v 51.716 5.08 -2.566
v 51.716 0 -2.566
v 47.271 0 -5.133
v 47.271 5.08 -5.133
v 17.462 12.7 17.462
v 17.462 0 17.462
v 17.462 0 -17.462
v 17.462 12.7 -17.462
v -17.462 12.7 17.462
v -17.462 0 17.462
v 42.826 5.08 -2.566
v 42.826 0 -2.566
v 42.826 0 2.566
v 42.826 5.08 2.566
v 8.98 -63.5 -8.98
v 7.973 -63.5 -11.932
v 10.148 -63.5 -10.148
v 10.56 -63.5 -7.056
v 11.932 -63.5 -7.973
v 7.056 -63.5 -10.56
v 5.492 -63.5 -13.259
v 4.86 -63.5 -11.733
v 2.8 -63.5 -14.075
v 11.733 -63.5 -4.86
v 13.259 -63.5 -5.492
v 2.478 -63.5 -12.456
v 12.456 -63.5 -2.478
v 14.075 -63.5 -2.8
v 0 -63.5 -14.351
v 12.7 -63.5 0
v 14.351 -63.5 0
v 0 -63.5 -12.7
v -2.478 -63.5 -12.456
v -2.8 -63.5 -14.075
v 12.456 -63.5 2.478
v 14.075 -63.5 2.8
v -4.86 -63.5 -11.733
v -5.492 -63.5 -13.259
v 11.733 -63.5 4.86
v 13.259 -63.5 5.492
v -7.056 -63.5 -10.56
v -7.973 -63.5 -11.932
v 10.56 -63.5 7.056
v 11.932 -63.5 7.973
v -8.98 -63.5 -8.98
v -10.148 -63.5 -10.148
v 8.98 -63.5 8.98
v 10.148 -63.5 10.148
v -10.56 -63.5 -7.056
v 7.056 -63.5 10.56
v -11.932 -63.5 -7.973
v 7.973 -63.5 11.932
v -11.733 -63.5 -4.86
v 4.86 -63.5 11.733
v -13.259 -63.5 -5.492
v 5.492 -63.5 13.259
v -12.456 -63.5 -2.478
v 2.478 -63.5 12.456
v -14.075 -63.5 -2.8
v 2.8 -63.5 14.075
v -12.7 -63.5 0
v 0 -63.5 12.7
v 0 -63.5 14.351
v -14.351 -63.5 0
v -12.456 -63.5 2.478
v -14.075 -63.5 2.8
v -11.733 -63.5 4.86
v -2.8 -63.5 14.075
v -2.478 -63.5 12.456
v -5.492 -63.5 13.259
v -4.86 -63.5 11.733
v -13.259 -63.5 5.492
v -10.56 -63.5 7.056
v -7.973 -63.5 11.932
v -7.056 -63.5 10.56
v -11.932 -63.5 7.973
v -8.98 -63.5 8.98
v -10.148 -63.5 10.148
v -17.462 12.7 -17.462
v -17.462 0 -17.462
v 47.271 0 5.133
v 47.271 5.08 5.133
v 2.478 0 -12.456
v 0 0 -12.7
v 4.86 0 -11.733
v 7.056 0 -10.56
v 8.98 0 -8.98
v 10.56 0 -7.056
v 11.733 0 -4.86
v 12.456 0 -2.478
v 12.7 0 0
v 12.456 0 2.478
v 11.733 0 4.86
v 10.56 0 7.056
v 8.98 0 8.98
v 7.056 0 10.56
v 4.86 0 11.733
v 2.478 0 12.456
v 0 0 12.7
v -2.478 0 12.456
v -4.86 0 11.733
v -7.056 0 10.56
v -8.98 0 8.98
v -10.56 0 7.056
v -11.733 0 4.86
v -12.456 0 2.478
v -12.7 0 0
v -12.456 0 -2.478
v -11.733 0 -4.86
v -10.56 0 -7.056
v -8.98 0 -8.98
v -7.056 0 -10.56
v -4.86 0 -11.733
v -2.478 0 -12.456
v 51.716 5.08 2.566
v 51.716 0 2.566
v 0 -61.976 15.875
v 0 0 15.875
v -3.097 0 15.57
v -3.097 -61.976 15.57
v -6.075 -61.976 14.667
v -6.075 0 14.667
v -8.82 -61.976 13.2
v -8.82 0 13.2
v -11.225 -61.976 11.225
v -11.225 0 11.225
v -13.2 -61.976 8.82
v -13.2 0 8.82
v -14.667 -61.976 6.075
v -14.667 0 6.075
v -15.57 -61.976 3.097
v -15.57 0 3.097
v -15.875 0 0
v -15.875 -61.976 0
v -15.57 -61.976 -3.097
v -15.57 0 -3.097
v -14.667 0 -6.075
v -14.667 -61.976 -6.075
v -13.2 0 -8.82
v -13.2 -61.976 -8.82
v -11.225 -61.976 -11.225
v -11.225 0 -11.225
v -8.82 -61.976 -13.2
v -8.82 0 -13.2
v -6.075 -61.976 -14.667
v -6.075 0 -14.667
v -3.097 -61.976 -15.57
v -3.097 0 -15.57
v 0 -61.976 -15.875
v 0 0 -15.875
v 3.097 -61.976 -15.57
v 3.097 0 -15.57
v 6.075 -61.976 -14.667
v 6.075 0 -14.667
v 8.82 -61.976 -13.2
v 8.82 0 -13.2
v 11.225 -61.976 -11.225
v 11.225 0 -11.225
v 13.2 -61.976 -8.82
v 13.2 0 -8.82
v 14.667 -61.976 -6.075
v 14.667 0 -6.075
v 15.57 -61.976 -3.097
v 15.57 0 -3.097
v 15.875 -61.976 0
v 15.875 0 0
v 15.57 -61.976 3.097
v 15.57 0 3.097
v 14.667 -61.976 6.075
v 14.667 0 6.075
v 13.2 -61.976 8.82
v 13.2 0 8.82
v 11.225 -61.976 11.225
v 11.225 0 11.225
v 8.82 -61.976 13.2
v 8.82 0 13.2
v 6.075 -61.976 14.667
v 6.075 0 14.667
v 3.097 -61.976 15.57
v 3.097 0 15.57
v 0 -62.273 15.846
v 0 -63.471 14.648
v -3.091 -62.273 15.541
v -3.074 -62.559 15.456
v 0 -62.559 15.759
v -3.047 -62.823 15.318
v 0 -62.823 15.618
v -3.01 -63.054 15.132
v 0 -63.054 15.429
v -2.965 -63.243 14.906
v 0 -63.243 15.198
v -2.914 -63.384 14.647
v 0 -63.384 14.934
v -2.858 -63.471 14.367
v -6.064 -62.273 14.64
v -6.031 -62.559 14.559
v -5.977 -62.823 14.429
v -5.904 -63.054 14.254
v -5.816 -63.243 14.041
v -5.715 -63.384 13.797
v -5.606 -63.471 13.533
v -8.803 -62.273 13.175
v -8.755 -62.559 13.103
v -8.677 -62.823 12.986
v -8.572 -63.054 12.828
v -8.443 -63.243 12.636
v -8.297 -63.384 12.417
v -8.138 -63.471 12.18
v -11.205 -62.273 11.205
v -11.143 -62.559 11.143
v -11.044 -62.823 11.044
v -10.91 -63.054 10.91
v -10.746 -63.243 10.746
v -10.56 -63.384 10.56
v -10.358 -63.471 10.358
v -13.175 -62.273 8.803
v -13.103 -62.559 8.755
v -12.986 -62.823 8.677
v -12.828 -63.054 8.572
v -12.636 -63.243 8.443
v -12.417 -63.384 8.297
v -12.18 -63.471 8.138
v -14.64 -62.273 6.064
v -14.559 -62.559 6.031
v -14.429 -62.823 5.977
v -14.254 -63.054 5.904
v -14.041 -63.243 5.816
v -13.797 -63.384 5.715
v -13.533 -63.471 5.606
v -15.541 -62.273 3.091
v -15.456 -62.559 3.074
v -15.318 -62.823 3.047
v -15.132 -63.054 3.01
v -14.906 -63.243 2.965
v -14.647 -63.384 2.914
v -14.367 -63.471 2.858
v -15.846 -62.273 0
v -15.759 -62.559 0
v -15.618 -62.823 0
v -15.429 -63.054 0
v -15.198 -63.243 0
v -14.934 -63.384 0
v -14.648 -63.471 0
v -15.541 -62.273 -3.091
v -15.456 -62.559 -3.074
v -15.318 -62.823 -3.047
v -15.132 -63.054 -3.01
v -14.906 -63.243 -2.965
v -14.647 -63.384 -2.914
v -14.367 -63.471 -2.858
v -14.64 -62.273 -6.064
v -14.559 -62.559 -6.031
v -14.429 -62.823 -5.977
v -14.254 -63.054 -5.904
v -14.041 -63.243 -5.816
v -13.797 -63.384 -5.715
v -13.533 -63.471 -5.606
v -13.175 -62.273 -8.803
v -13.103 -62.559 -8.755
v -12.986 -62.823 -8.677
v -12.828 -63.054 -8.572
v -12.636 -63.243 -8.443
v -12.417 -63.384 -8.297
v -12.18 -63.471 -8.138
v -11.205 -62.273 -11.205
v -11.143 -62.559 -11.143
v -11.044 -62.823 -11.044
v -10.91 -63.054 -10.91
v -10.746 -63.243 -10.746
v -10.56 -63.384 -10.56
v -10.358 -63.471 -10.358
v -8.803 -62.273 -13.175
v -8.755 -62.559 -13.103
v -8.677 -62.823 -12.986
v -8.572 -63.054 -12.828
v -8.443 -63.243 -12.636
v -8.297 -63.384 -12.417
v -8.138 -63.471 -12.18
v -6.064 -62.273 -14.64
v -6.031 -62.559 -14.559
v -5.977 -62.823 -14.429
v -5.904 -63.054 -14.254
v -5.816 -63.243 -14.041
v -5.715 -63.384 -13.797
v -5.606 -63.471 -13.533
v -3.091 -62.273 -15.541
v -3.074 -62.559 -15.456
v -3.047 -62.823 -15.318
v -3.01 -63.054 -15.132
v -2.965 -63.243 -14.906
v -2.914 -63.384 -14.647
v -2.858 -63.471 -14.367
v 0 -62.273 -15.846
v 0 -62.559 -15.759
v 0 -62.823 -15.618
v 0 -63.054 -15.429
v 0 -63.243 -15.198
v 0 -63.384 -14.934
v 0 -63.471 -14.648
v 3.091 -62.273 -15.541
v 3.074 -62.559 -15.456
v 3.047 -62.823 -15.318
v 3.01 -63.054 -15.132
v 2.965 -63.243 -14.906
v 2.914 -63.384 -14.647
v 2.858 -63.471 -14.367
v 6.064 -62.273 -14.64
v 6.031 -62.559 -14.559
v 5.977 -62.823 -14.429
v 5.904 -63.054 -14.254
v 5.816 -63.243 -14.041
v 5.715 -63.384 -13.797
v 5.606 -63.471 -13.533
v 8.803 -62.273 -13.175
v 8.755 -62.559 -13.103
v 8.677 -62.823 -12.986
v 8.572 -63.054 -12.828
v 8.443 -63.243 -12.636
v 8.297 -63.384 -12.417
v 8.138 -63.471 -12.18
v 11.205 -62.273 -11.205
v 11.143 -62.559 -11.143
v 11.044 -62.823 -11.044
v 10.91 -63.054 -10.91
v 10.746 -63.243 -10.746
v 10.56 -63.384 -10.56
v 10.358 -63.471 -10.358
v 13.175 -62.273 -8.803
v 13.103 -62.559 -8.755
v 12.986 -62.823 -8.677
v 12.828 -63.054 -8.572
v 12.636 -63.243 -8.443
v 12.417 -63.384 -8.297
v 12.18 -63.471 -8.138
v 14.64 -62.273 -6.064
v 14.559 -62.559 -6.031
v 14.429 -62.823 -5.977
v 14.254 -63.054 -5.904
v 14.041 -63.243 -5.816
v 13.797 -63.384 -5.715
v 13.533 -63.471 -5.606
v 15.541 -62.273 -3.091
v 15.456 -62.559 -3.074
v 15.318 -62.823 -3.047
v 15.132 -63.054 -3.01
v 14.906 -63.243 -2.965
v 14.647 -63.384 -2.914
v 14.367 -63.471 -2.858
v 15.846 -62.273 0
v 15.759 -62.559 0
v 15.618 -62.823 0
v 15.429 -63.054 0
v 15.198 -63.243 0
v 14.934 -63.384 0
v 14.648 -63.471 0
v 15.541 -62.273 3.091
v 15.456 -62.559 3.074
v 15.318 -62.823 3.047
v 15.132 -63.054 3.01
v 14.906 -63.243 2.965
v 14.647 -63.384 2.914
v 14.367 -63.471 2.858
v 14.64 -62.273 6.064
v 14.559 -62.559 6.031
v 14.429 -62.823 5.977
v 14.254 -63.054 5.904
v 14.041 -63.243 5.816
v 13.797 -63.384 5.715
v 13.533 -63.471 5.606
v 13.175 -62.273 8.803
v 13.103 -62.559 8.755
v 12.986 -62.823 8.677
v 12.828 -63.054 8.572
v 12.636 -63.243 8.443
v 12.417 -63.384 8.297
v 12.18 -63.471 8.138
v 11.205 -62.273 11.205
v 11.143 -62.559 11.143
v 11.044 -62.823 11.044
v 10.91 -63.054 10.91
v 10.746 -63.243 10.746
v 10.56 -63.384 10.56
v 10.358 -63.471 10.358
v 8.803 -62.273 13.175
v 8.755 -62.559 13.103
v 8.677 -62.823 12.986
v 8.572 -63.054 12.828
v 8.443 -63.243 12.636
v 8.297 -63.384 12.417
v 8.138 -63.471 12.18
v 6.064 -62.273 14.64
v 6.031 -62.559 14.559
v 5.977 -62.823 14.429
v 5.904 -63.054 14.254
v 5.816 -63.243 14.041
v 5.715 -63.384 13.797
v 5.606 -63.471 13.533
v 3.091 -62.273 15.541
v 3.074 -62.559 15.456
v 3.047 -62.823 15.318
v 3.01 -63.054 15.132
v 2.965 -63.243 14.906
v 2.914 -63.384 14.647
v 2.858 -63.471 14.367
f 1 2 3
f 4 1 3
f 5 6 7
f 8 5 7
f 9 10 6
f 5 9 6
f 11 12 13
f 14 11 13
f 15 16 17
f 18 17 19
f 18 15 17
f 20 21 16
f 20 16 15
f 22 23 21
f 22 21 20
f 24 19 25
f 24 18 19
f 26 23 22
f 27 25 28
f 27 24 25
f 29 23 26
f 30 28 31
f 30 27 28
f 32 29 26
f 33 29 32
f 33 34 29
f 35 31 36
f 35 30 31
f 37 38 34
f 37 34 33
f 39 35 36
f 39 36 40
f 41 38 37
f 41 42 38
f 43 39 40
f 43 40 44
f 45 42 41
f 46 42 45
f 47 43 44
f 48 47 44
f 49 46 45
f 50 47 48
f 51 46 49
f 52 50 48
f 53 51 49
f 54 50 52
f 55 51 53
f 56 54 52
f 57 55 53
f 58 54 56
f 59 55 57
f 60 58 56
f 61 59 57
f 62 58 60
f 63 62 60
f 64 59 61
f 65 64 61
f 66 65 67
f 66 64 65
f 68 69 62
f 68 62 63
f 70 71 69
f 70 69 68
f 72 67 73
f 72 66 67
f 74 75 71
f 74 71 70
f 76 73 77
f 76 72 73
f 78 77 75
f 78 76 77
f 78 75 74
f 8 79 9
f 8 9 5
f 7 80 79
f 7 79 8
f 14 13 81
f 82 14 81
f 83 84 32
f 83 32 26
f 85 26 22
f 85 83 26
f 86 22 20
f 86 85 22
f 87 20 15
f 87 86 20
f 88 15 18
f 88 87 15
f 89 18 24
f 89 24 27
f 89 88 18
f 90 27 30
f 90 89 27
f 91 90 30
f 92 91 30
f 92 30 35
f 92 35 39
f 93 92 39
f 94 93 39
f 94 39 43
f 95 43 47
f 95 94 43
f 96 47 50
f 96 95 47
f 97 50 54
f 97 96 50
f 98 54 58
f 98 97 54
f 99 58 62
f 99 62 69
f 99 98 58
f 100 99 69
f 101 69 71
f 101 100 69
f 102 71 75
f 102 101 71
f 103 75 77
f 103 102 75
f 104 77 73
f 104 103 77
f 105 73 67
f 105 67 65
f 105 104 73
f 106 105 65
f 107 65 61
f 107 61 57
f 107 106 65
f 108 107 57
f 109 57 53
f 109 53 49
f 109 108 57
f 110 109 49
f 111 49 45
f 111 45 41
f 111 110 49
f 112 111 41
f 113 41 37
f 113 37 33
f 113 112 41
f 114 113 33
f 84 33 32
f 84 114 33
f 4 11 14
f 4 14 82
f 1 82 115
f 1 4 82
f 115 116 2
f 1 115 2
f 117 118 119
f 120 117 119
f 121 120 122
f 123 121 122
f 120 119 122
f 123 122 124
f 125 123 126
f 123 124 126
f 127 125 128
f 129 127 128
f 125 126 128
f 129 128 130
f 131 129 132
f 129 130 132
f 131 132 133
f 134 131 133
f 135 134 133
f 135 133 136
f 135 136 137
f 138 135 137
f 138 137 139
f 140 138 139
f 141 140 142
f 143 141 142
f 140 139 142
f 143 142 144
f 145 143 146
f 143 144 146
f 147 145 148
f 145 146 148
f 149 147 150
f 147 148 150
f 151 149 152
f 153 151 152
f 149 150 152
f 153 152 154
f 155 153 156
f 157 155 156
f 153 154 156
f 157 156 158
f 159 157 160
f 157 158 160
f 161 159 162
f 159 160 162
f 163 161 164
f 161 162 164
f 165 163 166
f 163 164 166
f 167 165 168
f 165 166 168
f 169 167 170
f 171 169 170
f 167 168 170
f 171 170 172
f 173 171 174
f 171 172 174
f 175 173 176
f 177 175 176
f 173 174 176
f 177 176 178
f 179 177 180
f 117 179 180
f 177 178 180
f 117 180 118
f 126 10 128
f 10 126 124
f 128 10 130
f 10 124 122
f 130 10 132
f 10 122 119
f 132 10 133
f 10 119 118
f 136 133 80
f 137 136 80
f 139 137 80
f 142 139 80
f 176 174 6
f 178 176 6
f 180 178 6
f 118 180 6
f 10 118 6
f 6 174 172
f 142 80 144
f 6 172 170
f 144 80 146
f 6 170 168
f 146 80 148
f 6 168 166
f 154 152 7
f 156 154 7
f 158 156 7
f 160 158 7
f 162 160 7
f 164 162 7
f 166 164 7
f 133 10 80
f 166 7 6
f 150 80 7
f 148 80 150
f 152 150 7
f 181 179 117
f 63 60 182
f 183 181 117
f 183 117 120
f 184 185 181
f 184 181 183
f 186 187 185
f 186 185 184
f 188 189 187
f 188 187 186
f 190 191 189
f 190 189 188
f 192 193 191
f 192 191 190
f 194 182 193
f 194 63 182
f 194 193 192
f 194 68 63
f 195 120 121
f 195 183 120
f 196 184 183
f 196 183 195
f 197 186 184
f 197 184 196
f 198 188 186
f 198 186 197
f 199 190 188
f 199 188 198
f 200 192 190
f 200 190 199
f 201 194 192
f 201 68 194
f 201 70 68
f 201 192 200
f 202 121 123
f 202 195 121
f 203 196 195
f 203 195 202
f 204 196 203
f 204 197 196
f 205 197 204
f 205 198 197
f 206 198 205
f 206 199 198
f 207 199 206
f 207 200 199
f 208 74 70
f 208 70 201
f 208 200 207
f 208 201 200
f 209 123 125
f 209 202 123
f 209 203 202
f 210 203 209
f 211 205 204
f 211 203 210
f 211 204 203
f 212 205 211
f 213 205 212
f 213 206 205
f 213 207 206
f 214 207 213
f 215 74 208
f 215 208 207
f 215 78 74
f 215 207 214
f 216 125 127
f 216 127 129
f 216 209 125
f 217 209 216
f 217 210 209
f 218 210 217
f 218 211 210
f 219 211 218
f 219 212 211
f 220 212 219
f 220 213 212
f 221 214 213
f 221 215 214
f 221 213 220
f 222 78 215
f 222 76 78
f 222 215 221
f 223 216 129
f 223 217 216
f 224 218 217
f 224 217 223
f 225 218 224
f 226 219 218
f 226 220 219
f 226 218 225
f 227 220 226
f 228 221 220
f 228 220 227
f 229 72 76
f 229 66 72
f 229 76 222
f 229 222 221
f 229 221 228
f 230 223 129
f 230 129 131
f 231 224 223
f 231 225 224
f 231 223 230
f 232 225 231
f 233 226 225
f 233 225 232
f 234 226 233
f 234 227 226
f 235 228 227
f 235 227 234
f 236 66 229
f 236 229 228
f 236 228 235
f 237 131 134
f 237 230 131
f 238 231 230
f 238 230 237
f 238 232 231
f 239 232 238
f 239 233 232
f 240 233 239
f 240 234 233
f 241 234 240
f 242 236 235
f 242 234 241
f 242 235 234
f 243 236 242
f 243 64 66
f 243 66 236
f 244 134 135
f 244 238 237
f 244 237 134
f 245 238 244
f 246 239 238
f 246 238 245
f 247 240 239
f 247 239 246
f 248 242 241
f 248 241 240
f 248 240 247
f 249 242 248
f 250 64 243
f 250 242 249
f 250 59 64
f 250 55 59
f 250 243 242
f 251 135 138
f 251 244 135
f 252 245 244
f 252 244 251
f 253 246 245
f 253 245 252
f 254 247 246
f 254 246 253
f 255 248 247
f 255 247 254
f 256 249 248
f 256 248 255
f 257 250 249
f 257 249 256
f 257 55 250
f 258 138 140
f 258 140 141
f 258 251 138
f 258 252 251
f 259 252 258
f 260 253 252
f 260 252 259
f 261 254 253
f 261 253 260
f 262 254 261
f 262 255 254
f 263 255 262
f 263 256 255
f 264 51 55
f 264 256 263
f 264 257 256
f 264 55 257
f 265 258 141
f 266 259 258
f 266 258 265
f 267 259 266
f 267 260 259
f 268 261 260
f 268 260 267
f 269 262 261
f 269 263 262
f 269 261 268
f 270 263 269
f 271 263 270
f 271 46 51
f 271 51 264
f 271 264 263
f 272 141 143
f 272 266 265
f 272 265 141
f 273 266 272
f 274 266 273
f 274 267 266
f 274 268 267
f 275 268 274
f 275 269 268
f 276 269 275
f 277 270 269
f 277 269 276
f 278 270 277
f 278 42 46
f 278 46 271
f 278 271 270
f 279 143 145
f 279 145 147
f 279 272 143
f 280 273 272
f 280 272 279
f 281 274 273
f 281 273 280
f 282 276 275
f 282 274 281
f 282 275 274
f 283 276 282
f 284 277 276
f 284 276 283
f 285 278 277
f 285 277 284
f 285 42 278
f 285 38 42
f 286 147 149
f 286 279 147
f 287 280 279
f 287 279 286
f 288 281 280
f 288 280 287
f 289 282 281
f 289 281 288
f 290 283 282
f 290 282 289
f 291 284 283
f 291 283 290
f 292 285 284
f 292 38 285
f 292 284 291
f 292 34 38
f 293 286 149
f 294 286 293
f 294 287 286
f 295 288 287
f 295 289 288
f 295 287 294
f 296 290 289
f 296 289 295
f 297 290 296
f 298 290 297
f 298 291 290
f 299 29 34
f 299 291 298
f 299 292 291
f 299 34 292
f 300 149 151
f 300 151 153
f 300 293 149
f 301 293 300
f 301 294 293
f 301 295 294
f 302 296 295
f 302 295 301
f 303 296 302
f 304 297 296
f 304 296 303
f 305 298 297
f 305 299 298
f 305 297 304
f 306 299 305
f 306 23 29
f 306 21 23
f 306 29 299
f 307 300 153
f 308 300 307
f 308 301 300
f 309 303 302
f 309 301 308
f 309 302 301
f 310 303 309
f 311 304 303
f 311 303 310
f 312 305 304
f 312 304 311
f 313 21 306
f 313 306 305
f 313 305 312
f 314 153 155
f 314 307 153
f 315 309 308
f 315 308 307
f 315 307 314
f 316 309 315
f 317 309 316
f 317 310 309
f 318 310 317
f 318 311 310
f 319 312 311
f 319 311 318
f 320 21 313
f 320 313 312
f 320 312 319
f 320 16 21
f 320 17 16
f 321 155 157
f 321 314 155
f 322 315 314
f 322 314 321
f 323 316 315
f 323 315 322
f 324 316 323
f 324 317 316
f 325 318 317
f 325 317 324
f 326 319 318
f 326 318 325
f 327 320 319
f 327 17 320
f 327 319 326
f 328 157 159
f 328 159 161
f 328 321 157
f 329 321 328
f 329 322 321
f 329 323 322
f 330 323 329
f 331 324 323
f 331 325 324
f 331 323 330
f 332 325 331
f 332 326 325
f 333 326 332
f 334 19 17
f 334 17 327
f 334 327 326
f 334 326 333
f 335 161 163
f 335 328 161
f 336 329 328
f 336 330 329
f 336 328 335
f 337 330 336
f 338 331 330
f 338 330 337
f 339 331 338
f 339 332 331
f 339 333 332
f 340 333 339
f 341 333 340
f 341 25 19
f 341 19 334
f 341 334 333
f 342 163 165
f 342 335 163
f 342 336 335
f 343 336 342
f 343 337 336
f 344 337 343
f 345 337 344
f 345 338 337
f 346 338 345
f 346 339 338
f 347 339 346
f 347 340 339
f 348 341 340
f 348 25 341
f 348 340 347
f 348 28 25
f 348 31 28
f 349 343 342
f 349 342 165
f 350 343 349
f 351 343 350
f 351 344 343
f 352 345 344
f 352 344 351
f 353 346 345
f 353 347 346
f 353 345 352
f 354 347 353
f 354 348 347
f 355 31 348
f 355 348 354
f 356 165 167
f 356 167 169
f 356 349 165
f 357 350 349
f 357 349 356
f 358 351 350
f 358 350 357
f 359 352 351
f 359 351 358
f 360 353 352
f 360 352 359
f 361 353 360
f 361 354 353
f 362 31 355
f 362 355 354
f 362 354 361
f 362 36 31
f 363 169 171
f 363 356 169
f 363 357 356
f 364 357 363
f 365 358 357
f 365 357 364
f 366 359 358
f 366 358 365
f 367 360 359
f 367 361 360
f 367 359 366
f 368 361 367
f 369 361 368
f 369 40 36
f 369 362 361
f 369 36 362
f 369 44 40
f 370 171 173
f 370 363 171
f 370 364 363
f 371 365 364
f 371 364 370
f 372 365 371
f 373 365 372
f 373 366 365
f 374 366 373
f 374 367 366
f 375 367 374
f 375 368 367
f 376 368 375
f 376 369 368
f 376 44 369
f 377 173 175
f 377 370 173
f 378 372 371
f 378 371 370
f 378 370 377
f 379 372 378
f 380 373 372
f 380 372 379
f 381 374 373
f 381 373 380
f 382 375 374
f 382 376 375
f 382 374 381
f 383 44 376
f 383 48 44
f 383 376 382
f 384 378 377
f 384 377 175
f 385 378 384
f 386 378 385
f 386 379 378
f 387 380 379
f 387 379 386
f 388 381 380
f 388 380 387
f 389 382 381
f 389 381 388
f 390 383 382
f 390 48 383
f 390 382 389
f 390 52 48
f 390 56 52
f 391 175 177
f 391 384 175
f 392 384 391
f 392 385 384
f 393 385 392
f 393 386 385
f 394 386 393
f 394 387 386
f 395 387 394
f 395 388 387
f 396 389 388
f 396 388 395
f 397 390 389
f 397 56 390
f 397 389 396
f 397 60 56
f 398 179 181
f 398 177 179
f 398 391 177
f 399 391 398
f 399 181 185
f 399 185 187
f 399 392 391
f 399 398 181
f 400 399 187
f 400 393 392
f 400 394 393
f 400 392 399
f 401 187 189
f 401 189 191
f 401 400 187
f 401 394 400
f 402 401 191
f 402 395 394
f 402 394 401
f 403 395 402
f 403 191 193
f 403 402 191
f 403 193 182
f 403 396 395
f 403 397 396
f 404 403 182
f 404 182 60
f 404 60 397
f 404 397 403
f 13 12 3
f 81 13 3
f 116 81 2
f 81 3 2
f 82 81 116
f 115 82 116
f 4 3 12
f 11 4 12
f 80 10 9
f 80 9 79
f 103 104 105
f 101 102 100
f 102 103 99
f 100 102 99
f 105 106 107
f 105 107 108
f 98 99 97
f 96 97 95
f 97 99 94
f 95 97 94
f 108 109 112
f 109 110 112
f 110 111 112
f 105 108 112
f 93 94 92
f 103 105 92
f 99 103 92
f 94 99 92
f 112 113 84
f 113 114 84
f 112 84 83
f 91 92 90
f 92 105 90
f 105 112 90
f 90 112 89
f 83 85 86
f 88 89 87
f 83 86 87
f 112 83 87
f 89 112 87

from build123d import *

# Parameters (mm, degrees)
SKETCH1_W           = 34.925
SKETCH1_H           = 34.925
BOSS_EXTRUDE1_DEPTH = 12.7
SKETCH3_R           = 15.875
SKETCH3_R_2         = 12.7
BOSS_EXTRUDE2_DEPTH = 63.5
FILLET1_R           = 1.524
BOSS_EXTRUDE3_DEPTH = 5.08


with BuildPart() as part:
    # Sketch1 → Boss-Extrude1 (new body)
    with BuildSketch(Plane(origin=(0, 0, 0), x_dir=(1, 0, 0), z_dir=(0, 1, 0))):
        Rectangle(SKETCH1_W, SKETCH1_H)
    extrude(amount=BOSS_EXTRUDE1_DEPTH)

    # Sketch3 → Boss-Extrude2 (add)
    with BuildSketch(Plane.XZ):
        with Locations(Location((0, 0, 0), (0, 0, 90))):
            Circle(SKETCH3_R)
        with Locations(Location((0, 0, 0), (0, 0, 270))):
            Circle(SKETCH3_R_2, mode=Mode.SUBTRACT)
    extrude(amount=BOSS_EXTRUDE2_DEPTH)

    # Fillet1
    fillet1_edges = [part.edges().sort_by_distance(p)[0] for p in [
        (0, -63.5, -15.875),
    ]]
    fillet(fillet1_edges, radius=FILLET1_R)


with BuildPart() as body_2:
    # Sketch5 → Boss-Extrude3 (new body)
    with BuildSketch(Plane(origin=(0, 0, 0), x_dir=(1, 0, 0), z_dir=(0, 1, 0))):
        Polygon((47.271077343, -5.132643893), (51.716077343, -2.566321947), (51.716077343, 2.566321947), (47.271077343, 5.132643893), (42.826077343, 2.566321947), (42.826077343, -2.566321947), align=None)
    extrude(amount=BOSS_EXTRUDE3_DEPTH)


solid = Compound([part.part, body_2.part])
